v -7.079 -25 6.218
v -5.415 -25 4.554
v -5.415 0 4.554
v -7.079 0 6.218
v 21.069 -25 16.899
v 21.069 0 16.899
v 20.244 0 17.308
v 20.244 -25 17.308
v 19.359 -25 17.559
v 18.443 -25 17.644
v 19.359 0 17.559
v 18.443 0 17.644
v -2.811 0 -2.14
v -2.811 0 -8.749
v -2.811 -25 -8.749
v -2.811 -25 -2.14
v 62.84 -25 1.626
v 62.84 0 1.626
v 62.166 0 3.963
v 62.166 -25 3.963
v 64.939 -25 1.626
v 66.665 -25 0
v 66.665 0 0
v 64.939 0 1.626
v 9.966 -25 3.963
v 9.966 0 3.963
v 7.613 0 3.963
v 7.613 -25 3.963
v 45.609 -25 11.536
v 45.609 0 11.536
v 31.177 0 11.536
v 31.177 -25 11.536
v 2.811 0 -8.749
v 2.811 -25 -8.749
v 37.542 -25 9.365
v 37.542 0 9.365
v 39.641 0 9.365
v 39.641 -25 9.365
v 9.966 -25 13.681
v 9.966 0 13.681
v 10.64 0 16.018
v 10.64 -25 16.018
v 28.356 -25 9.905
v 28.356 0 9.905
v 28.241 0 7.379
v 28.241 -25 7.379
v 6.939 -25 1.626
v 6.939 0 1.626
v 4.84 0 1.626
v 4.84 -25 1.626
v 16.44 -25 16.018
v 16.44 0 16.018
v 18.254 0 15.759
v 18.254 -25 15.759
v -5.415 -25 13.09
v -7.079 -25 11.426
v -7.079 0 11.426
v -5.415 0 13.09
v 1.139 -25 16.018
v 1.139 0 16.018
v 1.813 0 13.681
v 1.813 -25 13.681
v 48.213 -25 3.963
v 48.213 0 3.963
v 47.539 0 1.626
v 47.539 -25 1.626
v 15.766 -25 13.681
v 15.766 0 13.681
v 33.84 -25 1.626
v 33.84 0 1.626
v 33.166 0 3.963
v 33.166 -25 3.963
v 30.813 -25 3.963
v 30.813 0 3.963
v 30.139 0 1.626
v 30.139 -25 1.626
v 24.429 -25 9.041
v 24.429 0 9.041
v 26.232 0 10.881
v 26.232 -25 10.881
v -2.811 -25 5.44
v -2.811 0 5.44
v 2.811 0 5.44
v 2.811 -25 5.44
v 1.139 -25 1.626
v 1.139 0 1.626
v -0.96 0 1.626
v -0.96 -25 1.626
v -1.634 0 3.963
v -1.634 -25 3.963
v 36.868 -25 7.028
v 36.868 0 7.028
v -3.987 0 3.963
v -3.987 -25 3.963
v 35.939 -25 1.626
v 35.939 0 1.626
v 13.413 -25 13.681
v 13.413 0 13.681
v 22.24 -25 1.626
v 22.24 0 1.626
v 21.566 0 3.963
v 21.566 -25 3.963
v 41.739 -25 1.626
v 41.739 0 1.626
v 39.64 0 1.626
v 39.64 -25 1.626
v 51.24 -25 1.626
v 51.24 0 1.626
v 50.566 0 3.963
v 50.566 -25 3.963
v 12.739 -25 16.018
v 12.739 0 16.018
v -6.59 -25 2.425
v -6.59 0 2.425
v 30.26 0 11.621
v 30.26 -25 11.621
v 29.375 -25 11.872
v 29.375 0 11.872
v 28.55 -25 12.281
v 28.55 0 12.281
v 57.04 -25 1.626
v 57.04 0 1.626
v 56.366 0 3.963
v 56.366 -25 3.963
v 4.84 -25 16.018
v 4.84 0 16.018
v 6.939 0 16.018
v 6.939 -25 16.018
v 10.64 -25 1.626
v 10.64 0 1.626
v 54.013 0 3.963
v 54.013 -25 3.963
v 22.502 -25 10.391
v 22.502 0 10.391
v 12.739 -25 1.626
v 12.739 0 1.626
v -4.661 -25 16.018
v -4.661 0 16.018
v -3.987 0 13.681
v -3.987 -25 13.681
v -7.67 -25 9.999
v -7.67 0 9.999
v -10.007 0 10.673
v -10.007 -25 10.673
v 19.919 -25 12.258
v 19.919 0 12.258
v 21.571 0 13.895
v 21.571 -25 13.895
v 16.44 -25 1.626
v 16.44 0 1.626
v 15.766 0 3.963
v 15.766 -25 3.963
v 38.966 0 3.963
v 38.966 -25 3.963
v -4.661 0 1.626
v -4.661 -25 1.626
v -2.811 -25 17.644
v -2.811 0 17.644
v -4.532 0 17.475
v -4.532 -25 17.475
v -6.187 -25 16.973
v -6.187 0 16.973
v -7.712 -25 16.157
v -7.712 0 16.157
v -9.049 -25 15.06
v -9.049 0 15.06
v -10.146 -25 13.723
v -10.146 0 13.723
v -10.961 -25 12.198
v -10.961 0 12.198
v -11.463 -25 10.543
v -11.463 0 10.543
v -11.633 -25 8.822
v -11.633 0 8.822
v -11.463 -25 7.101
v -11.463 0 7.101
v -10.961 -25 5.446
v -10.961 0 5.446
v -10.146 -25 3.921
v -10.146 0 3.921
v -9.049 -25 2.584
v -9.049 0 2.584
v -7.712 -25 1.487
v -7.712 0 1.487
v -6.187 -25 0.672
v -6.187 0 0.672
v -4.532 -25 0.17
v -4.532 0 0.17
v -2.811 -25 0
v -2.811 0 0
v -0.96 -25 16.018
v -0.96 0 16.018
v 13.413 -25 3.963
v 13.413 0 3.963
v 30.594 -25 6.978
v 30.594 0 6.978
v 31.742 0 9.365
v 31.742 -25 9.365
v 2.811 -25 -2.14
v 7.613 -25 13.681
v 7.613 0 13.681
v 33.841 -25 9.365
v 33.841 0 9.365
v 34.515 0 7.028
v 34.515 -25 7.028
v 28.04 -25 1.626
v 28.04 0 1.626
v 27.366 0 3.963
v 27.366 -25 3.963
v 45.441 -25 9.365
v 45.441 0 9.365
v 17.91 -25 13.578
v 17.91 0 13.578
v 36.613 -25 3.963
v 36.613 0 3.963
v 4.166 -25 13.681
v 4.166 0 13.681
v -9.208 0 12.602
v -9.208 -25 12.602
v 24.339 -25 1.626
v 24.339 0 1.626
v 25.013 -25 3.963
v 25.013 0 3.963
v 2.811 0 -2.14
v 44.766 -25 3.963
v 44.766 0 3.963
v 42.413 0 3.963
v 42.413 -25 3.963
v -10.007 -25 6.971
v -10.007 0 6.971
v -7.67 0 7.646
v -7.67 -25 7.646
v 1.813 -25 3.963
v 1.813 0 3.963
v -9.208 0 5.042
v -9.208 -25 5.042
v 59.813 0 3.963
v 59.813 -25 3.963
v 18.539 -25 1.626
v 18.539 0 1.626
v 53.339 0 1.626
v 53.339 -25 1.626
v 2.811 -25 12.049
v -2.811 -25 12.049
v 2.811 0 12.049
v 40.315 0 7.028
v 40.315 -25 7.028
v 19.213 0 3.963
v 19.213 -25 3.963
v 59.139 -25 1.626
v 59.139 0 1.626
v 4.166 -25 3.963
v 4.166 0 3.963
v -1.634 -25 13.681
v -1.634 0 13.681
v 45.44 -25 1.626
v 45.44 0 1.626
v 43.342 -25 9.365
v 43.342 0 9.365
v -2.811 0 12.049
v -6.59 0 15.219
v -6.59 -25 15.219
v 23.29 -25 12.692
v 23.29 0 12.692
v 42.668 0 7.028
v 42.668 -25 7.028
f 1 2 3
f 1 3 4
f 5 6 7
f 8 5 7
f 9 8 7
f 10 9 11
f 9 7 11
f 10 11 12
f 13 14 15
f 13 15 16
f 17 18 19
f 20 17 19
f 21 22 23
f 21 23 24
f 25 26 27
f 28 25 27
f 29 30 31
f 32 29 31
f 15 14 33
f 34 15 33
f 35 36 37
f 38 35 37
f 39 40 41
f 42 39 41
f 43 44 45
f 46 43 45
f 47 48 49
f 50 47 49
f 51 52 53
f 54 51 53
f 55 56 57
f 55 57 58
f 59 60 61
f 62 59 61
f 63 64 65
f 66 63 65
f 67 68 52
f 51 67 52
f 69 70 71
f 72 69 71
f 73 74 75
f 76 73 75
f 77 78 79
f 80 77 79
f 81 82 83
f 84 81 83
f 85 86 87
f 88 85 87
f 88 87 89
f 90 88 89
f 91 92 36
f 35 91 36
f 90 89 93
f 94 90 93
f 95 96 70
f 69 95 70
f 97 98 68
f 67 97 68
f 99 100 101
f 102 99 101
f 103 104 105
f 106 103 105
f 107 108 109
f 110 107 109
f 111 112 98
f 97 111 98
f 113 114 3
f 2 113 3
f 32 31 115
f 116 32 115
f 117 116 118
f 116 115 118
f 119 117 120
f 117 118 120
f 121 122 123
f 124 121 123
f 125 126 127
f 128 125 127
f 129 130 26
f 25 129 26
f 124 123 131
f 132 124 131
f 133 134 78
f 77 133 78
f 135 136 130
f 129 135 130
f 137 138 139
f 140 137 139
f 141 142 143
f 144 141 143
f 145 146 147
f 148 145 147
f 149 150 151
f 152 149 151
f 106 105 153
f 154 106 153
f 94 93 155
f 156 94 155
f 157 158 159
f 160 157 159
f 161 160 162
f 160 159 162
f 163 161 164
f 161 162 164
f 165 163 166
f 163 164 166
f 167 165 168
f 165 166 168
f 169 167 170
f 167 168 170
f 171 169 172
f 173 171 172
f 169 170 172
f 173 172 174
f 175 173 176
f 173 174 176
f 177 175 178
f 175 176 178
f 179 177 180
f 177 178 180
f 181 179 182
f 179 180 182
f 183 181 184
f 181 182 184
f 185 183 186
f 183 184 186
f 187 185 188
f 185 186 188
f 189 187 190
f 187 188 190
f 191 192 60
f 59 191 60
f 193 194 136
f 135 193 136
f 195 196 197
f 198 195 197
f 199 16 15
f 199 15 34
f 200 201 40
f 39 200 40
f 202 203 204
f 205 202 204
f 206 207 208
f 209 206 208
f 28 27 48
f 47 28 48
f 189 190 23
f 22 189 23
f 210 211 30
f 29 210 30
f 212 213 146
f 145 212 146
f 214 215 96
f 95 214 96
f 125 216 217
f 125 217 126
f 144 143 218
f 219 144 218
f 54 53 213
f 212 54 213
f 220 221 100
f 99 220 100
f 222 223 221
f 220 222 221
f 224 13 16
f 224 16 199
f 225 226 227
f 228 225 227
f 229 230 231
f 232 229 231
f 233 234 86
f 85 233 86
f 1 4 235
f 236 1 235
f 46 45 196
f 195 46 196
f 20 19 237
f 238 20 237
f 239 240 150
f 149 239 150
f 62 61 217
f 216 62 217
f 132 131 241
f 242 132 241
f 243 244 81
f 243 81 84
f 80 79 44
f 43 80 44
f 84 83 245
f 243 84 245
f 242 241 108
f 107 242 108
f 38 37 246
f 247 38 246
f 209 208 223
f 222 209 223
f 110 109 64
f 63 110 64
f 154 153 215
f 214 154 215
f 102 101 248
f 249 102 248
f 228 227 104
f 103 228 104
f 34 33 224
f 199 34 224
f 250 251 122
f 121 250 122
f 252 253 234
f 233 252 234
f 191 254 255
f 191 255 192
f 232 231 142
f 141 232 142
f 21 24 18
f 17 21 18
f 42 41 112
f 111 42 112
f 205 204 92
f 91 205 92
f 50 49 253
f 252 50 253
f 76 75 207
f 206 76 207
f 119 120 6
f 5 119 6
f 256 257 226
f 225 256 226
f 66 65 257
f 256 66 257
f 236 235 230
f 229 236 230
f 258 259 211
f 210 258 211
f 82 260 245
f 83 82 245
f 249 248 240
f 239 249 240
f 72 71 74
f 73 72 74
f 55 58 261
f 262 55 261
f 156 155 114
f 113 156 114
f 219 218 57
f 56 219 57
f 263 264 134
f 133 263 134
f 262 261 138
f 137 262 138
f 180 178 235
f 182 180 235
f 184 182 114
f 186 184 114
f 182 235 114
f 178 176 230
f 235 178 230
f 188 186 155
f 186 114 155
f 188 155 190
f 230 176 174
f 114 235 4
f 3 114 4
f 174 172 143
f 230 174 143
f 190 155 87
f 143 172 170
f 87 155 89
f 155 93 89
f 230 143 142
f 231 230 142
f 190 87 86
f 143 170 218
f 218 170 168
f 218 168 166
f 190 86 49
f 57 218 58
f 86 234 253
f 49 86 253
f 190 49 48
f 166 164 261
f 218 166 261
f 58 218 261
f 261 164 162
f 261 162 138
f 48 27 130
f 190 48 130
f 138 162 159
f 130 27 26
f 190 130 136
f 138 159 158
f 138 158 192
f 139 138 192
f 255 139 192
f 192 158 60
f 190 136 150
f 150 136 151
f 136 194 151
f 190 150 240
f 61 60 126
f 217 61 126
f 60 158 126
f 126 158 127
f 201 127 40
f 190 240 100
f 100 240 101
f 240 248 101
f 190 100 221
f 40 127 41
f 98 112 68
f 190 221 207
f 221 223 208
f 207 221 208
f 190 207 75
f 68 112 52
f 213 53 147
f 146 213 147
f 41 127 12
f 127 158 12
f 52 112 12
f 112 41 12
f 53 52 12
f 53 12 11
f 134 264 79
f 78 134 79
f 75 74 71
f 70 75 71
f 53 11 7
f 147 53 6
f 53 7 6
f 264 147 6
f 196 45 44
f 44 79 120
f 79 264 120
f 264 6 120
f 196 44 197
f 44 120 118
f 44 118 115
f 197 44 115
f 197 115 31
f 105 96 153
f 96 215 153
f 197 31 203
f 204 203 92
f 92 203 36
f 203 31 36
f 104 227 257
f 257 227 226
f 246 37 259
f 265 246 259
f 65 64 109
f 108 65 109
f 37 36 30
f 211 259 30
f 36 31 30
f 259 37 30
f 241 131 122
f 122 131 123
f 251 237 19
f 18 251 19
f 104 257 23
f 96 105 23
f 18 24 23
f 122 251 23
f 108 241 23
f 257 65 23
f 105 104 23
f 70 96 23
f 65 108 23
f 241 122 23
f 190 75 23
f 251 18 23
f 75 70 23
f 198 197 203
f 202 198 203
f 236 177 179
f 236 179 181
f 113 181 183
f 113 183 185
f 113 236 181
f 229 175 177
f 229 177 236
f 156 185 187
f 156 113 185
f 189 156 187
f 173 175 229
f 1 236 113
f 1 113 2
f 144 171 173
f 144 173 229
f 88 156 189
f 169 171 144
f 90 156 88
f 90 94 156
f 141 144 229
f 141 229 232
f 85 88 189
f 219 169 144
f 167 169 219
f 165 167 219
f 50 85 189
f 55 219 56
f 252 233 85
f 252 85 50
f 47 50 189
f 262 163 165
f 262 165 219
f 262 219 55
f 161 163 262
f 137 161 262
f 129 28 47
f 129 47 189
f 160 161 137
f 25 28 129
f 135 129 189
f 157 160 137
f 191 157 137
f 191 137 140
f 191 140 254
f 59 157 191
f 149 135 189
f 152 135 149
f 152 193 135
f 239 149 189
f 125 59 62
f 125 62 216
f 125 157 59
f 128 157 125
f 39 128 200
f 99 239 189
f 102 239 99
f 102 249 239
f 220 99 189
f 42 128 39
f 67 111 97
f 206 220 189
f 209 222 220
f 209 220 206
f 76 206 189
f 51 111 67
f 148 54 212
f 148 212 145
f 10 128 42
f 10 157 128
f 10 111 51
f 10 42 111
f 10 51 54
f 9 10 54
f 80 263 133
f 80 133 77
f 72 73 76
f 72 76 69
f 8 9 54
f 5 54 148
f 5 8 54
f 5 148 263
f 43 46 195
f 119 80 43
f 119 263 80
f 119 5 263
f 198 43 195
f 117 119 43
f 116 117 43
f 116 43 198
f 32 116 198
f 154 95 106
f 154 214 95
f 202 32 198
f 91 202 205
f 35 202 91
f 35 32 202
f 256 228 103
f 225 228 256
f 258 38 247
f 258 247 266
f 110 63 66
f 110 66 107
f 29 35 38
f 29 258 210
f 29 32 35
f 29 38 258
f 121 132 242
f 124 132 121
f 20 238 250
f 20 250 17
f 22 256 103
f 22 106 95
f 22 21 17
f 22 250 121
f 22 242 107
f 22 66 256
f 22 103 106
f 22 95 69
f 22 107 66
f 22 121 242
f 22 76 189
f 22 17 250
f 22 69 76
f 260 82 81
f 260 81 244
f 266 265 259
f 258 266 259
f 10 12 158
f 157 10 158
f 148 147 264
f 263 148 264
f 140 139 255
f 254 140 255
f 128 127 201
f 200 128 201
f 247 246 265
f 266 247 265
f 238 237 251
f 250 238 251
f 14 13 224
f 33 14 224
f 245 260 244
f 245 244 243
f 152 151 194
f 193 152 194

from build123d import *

# Parameters (mm, degrees)
F0_W     = 5.621214
F0_H     = 6.609323
F1_DEPTH = 25


with BuildPart() as f1:
    # F0 (on Front) → F1 (new body)
    with BuildSketch(Plane.XZ):
        with Locations((0, 8.744186)):
            Rectangle(F0_W, F0_H)
        with Locations((0, -5.44419)):
            Rectangle(F0_W, F0_H)
        with BuildLine():
            Line((18.44262, 17.644169), (-2.810607, 17.644169))
            ThreePointArc((-2.810607, 17.644169), (-11.632691, 8.822084), (-2.810607, 0))
            Line((-2.810607, 0), (66.665268, 0))
            Line((66.665268, 0), (64.938686, 1.625811))
            Line((64.938686, 1.625811), (62.8401, 1.625811))
            Line((62.8401, 1.625811), (62.165848, 3.962677))
            Line((62.165848, 3.962677), (59.812938, 3.962677))
            Line((59.812938, 3.962677), (59.138686, 1.625811))
            Line((59.138686, 1.625811), (57.0401, 1.625811))
            Line((57.0401, 1.625811), (56.365848, 3.962677))
            Line((56.365848, 3.962677), (54.012938, 3.962677))
            Line((54.012938, 3.962677), (53.338686, 1.625811))
            Line((53.338686, 1.625811), (51.2401, 1.625811))
            Line((51.2401, 1.625811), (50.565848, 3.962677))
            Line((50.565848, 3.962677), (48.212938, 3.962677))
            Line((48.212938, 3.962677), (47.538686, 1.625811))
            Line((47.538686, 1.625811), (45.4401, 1.625811))
            Line((45.4401, 1.625811), (44.765848, 3.962677))
            Line((44.765848, 3.962677), (42.412938, 3.962677))
            Line((42.412938, 3.962677), (41.738686, 1.625811))
            Line((41.738686, 1.625811), (39.6401, 1.625811))
            Line((39.6401, 1.625811), (38.965848, 3.962677))
            Line((38.965848, 3.962677), (36.612938, 3.962677))
            Line((36.612938, 3.962677), (35.938686, 1.625811))
            Line((35.938686, 1.625811), (33.8401, 1.625811))
            Line((33.8401, 1.625811), (33.165848, 3.962677))
            Line((33.165848, 3.962677), (30.812938, 3.962677))
            Line((30.812938, 3.962677), (30.138686, 1.625811))
            Line((30.138686, 1.625811), (28.0401, 1.625811))
            Line((28.0401, 1.625811), (27.365848, 3.962677))
            Line((27.365848, 3.962677), (25.012938, 3.962677))
            Line((25.012938, 3.962677), (24.338686, 1.625811))
            Line((24.338686, 1.625811), (22.2401, 1.625811))
            Line((22.2401, 1.625811), (21.565848, 3.962677))
            Line((21.565848, 3.962677), (19.212938, 3.962677))
            Line((19.212938, 3.962677), (18.538686, 1.625811))
            Line((18.538686, 1.625811), (16.4401, 1.625811))
            Line((16.4401, 1.625811), (15.765848, 3.962677))
            Line((15.765848, 3.962677), (13.412938, 3.962677))
            Line((13.412938, 3.962677), (12.738686, 1.625811))
            Line((12.738686, 1.625811), (10.6401, 1.625811))
            Line((10.6401, 1.625811), (9.965848, 3.962677))
            Line((9.965848, 3.962677), (7.612938, 3.962677))
            Line((7.612938, 3.962677), (6.938686, 1.625811))
            Line((6.938686, 1.625811), (4.8401, 1.625811))
            Line((4.8401, 1.625811), (4.165848, 3.962677))
            Line((4.165848, 3.962677), (1.812938, 3.962677))
            Line((1.812938, 3.962677), (1.138686, 1.625811))
            Line((1.138686, 1.625811), (-0.9599, 1.625811))
            Line((-0.9599, 1.625811), (-1.634152, 3.962677))
            Line((-1.634152, 3.962677), (-3.987062, 3.962677))
            Line((-3.987062, 3.962677), (-4.661314, 1.625811))
            Line((-4.661314, 1.625811), (-6.590493, 2.424903))
            Line((-6.590493, 2.424903), (-5.414847, 4.554085))
            Line((-5.414847, 4.554085), (-7.078606, 6.217844))
            Line((-7.078606, 6.217844), (-9.207789, 5.042198))
            Line((-9.207789, 5.042198), (-10.006881, 6.971377))
            Line((-10.006881, 6.971377), (-7.670014, 7.645629))
            Line((-7.670014, 7.645629), (-7.670014, 9.998539))
            Line((-7.670014, 9.998539), (-10.006881, 10.672791))
            Line((-10.006881, 10.672791), (-9.207789, 12.601971))
            Line((-9.207789, 12.601971), (-7.078606, 11.426324))
            Line((-7.078606, 11.426324), (-5.414847, 13.090083))
            Line((-5.414847, 13.090083), (-6.590493, 15.219266))
            Line((-6.590493, 15.219266), (-4.661314, 16.018358))
            Line((-4.661314, 16.018358), (-3.987062, 13.681491))
            Line((-3.987062, 13.681491), (-1.634152, 13.681491))
            Line((-1.634152, 13.681491), (-0.9599, 16.018358))
            Line((-0.9599, 16.018358), (1.138686, 16.018358))
            Line((1.138686, 16.018358), (1.812938, 13.681491))
            Line((1.812938, 13.681491), (4.165848, 13.681491))
            Line((4.165848, 13.681491), (4.8401, 16.018358))
            Line((4.8401, 16.018358), (6.938686, 16.018358))
            Line((6.938686, 16.018358), (7.612938, 13.681491))
            Line((7.612938, 13.681491), (9.965848, 13.681491))
            Line((9.965848, 13.681491), (10.6401, 16.018358))
            Line((10.6401, 16.018358), (12.738686, 16.018358))
            Line((12.738686, 16.018358), (13.412938, 13.681491))
            Line((13.412938, 13.681491), (15.765848, 13.681491))
            Line((15.765848, 13.681491), (16.4401, 16.018358))
            Line((16.4401, 16.018358), (18.254328, 15.759064))
            Line((18.254328, 15.759064), (17.909963, 13.578082))
            Line((17.909963, 13.578082), (19.918763, 12.258014))
            Line((19.918763, 12.258014), (21.570707, 13.895314))
            Line((21.570707, 13.895314), (23.289767, 12.691615))
            Line((23.289767, 12.691615), (22.501711, 10.39063))
            Line((22.501711, 10.39063), (24.429102, 9.041057))
            Line((24.429102, 9.041057), (26.232135, 10.880549))
            Line((26.232135, 10.880549), (28.355726, 9.904847))
            Line((28.355726, 9.904847), (28.240936, 7.379497))
            Line((28.240936, 7.379497), (30.594104, 6.977737))
            Line((30.594104, 6.977737), (31.742264, 9.364871))
            Line((31.742264, 9.364871), (33.840849, 9.364871))
            Line((33.840849, 9.364871), (34.515101, 7.028005))
            Line((34.515101, 7.028005), (36.868012, 7.028005))
            Line((36.868012, 7.028005), (37.542264, 9.364871))
            Line((37.542264, 9.364871), (39.640849, 9.364871))
            Line((39.640849, 9.364871), (40.315101, 7.028005))
            Line((40.315101, 7.028005), (42.668012, 7.028005))
            Line((42.668012, 7.028005), (43.342264, 9.364871))
            Line((43.342264, 9.364871), (45.440849, 9.364871))
            Line((45.440849, 9.364871), (45.60869, 11.536179))
            Line((45.60869, 11.536179), (31.176531, 11.536179))
            ThreePointArc((31.176531, 11.536179), (29.811663, 11.726071), (28.550467, 12.281324))
            Line((28.550467, 12.281324), (21.068683, 16.899023))
            ThreePointArc((21.068683, 16.899023), (19.807487, 17.454276), (18.44262, 17.644169))
        make_face()
    extrude(amount=F1_DEPTH)


solid = f1.part
